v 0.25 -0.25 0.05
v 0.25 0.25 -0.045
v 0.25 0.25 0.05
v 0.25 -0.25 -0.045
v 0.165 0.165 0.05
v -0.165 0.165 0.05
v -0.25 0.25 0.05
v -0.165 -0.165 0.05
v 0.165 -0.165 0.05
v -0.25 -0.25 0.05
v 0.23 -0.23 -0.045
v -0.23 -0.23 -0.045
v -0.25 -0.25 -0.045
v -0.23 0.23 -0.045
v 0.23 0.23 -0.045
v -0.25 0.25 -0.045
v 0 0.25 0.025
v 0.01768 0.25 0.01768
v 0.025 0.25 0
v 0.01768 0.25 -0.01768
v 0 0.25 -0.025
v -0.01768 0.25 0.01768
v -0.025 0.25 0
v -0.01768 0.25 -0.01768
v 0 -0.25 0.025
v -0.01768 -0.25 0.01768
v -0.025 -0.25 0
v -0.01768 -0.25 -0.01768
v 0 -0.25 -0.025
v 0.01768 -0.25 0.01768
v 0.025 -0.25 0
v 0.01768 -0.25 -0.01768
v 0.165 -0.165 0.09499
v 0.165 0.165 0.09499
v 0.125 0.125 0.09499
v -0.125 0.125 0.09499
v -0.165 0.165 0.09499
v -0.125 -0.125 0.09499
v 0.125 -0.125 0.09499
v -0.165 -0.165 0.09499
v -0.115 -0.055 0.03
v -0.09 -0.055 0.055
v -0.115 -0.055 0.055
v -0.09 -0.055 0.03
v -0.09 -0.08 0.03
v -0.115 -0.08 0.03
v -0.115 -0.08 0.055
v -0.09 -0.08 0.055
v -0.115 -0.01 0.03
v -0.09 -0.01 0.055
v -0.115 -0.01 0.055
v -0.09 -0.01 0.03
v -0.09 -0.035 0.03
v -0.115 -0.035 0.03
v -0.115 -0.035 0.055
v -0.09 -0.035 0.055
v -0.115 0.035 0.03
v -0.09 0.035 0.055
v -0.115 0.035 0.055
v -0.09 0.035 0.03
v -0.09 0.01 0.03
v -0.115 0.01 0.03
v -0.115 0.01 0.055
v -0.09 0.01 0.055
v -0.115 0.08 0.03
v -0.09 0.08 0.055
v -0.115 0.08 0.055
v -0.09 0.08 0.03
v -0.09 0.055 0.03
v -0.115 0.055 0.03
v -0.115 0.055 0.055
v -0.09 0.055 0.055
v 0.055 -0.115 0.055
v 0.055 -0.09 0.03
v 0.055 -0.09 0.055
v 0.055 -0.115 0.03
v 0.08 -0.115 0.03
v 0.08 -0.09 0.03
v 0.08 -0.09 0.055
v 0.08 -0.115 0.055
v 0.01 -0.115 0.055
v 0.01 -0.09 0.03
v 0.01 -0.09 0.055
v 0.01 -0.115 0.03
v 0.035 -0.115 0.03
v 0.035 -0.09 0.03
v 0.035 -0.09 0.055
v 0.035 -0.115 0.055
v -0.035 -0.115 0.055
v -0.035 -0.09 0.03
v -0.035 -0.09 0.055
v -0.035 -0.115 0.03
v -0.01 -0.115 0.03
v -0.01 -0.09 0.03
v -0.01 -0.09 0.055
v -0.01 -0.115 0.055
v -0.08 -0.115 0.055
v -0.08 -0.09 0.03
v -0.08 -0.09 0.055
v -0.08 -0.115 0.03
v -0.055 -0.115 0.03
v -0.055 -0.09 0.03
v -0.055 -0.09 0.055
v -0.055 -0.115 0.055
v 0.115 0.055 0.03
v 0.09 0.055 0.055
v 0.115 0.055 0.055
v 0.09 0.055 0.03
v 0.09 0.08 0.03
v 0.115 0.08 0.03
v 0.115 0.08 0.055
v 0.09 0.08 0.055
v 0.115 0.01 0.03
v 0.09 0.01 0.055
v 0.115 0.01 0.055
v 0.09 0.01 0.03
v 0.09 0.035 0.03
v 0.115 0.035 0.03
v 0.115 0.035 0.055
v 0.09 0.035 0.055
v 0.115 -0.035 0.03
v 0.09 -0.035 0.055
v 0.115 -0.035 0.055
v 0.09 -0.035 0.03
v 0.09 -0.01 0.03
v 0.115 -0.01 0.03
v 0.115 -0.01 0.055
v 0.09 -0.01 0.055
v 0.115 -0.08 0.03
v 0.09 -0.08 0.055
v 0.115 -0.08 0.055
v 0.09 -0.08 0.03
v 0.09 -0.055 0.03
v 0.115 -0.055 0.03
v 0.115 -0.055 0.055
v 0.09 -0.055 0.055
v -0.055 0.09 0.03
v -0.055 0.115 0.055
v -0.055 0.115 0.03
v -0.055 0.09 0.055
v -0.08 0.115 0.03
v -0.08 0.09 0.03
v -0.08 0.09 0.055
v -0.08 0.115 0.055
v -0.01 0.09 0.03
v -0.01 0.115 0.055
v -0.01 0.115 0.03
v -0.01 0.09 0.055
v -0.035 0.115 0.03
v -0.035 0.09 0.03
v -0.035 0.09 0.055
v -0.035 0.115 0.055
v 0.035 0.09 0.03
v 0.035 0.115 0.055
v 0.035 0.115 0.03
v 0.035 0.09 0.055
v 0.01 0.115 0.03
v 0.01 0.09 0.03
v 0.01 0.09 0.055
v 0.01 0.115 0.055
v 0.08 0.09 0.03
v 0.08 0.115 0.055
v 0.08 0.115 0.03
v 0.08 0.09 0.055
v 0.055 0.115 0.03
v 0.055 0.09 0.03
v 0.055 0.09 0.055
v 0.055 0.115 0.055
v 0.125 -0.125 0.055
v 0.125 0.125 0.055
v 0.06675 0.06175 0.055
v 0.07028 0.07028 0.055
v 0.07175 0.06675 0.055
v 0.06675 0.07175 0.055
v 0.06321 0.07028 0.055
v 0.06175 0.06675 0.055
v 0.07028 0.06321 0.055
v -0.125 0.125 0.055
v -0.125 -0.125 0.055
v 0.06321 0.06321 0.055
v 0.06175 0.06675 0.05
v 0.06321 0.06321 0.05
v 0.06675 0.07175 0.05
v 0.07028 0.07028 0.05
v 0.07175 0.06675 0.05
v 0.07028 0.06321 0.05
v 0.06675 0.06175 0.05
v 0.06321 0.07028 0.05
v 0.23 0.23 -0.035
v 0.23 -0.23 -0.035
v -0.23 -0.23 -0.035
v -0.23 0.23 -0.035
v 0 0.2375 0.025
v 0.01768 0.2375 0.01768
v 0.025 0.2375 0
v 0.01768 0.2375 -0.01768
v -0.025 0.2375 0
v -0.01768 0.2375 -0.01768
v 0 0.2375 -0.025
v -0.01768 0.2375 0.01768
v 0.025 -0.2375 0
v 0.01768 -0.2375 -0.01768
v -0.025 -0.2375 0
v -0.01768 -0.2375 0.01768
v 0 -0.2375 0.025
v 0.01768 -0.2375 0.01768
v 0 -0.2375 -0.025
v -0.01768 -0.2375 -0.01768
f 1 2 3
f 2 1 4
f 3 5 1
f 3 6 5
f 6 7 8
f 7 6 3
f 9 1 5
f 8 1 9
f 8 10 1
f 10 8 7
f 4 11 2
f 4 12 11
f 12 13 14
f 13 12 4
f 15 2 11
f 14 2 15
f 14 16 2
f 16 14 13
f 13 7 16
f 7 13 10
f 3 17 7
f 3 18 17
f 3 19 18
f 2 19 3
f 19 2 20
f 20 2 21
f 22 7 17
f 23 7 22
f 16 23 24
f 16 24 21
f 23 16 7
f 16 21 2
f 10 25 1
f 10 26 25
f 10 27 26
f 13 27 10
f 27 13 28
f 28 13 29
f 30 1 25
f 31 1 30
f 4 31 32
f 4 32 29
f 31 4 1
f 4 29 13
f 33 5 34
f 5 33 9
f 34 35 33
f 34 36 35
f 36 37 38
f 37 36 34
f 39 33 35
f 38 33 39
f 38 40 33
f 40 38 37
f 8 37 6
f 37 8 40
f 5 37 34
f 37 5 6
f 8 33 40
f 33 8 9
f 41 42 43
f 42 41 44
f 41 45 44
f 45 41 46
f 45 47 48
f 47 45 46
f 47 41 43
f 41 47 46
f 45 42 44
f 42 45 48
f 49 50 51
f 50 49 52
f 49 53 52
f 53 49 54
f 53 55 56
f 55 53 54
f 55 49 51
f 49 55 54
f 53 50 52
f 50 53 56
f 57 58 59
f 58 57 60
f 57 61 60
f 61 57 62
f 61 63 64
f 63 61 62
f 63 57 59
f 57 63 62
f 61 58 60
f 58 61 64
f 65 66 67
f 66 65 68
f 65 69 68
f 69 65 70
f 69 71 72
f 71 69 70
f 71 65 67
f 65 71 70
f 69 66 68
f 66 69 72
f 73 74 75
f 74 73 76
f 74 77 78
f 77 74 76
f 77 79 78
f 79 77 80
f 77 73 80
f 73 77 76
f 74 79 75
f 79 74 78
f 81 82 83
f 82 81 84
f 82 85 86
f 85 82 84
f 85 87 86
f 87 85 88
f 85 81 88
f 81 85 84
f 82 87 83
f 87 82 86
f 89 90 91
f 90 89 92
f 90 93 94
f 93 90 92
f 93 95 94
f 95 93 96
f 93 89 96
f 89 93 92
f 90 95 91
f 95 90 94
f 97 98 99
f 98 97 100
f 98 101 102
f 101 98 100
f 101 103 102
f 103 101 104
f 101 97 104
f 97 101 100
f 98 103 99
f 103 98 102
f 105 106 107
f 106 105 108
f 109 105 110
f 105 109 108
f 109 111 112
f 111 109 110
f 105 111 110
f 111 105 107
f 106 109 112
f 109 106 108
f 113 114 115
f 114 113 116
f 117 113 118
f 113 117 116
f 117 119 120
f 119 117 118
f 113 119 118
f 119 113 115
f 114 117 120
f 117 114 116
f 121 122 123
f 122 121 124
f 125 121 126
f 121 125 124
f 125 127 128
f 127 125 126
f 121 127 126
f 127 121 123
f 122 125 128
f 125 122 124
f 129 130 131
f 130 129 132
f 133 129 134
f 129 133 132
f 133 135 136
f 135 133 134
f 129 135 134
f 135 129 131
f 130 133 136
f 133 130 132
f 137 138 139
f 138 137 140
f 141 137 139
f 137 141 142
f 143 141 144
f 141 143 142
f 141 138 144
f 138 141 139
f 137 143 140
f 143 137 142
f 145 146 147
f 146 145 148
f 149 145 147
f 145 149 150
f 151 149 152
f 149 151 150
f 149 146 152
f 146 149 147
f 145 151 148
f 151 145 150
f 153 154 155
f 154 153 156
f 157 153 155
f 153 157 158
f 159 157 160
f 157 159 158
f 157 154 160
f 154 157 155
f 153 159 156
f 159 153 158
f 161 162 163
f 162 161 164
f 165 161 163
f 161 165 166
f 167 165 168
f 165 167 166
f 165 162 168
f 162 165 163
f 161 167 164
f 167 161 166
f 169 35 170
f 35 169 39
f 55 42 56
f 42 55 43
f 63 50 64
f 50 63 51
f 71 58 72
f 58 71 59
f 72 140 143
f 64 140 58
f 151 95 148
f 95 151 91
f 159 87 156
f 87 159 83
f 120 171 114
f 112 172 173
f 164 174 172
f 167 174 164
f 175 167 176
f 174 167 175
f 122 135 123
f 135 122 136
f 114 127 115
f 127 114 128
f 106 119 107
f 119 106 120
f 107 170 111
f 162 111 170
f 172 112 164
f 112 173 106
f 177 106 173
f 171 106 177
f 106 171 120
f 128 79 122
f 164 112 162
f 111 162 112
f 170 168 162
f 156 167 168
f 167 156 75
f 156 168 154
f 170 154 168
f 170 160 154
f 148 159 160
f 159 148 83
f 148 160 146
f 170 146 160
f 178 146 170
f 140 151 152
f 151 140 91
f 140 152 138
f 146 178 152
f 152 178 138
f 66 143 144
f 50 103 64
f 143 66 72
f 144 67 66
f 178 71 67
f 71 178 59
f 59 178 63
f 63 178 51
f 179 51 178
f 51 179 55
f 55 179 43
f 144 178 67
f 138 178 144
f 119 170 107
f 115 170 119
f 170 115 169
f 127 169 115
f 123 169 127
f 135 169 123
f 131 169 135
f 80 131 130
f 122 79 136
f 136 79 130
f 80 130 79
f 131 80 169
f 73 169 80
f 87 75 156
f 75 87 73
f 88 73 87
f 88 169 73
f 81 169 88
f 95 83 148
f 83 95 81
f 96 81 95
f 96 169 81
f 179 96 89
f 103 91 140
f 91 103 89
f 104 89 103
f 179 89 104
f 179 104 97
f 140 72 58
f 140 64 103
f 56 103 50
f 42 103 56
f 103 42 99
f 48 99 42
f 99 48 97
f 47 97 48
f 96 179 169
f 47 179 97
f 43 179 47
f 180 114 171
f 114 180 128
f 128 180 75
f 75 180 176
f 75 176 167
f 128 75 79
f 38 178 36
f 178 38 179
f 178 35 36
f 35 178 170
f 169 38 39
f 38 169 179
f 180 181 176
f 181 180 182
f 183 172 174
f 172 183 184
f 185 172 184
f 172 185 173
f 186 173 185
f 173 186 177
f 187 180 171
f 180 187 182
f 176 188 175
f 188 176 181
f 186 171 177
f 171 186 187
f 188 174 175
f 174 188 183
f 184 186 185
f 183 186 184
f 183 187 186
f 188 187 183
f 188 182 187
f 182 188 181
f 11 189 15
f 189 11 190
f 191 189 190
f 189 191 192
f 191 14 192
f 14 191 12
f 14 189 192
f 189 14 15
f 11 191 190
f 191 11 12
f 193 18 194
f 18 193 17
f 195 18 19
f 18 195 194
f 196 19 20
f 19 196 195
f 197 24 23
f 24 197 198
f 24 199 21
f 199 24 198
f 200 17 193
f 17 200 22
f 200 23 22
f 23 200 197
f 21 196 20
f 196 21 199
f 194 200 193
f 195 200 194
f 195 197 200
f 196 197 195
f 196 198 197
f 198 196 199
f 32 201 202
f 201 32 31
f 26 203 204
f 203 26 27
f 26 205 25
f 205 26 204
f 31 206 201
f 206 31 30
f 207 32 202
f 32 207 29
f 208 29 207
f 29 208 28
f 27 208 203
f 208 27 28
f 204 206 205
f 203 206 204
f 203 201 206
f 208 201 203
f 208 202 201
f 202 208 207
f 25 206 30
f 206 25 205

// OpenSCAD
// file: DataSymbol.scad
boxSize = 0.029;
lineSize = 0.0045;
symDepth = 0.01;
vertSeparation = 0.019;
horizSeparation = 0.018;

module DataSymbol() {
  boxVertCenter = (boxSize+vertSeparation)/2;
  boxHorizCenter = (boxSize+horizSeparation)/2;
  linear_extrude(symDepth, center=true) {
    translate([0,boxVertCenter]) square(boxSize, center=true); // top box
    translate([-boxHorizCenter,-boxVertCenter]) square(boxSize, center=true); // bottom left box
    translate([boxHorizCenter,-boxVertCenter]) square(boxSize, center=true); // bottom right box
    square([2*boxHorizCenter + lineSize, lineSize], center=true); // middle line
    translate([0, horizSeparation/4]) square([lineSize, horizSeparation/2 + lineSize], center=true); // line to top
    translate([-boxHorizCenter, -horizSeparation/4]) square([lineSize, horizSeparation/2 + lineSize], center=true); // line to bottom left
    translate([boxHorizCenter, -horizSeparation/4]) square([lineSize, horizSeparation/2 + lineSize], center=true); // line to bottom right
  }
}

DataSymbol();
// file: PowerSymbol.scad
symWidth = 0.038;
symHeight = 0.086;
symDepth = 0.01;
middleHeight = 0.0075;
topHorizOffset = 0.007;
sideVertOffset = 0.007;

module PowerSymbol() {
  linear_extrude(symDepth, center=true) {
    halfHei = symHeight/2;
    halfWid = symWidth/2;
    halfMid = middleHeight/2;
    polygon([
      [topHorizOffset, halfHei],
      [0, halfMid],
      [halfWid, sideVertOffset],
      [-topHorizOffset, -halfHei],
      [0, -halfMid],
      [-halfWid, -sideVertOffset]
    ]);
  }
}

PowerSymbol();
// file: BasicFPGAHousing_paintcap.scad
include <FPGA_shared.scad>;
use <BasicFPGAHousing_base.scad>;

module BasicFPGAHousing_paintcap() {
  bevelDepth = capBevel * sqrt(2);
  difference() {
    translate([0,0,baseTop]) {
      cube(size=[capSize, capSize, capDepth*2], center=true);
    }
    cube(size=[slotSize+eps, slotSize+eps, smallGridSize], center=true);
    for (edge=[1:4]) rotate([0,0,90*edge]) {
      translate([0,capSize/2,baseTop+capDepth]) rotate([45,0,0])
        cube(size=[capSize+0.1, bevelDepth, bevelDepth*2], center=true);
    }
  }
}

%BasicFPGAHousing_base();
BasicFPGAHousing_paintcap();
// file: BasicFPGAHousing_base.scad
include <FPGA_shared.scad>;
use <BasicFPGAHousing_paintcap.scad>;
use <PowerSymbol.scad>;
use <DataSymbol.scad>;

module BasicFPGAHousing_chipcutout() {
  slotPinBaseOffset = (-slotPinEdgeCount-1)/2 * slotPinEdgeSpacing;
  slotPinEdgeOffset = slotSize/2 - slotPinSize/2 - slotPinEdgePad;
  union() {
    translate([0, 0, baseDepth/2 + slotBottom + slotPinDepth]) {
      cube(size=[slotSize, slotSize, baseDepth], center=true);
    }
    for(edge=[1:4]) rotate([0,0,90*edge]) {
      for(i=[1:slotPinEdgeCount]) {
        translate([
          slotPinBaseOffset + slotPinEdgeSpacing*i,
          slotPinEdgeOffset,
          slotBottom + slotPinDepth
        ]) {
          cube(size=[slotPinSize, slotPinSize, slotPinDepth*2], center=true);
        }
      }
    }
    translate([alignHoleOffset,alignHoleOffset,slotBottom + slotPinDepth])
      cylinder(h=alignHoleDepth*2, r=alignHoleRadius, center=true, $fn=alignHoleSides);
  }
}

module BasicFPGAHousing_base() {
  middleSize = (slotSize + capSize) / 2;
  difference() {
    union() {
      translate([0,0,baseCenter])
        cube(size=[baseSize, baseSize, baseDepth], center=true);
      translate([0,0,baseTop-eps])
        cube(size=[middleSize, middleSize, capDepth*2], center=true);
    }
    translate([0,0,baseBottom])
      cube(size=[baseBackCutoutSize, baseBackCutoutSize, baseBackCutoutDepth*2], center=true);
    BasicFPGAHousing_chipcutout();
  }
}

BasicFPGAHousing_base();
%BasicFPGAHousing_paintcap();
// file: FPGA_shared.scad
smallGridSize = 0.5;
baseSize = smallGridSize;
baseTop = 0.05;
baseBottom = -0.045;
baseDepth = baseTop - baseBottom;
baseCenter = (baseTop + baseBottom)/2;
baseBackRim = 0.02;
baseBackCutoutSize = baseSize - baseBackRim*2;
baseBackCutoutDepth = 0.01;
capSize = 0.41;
capDepth = 0.045;
capBevel = 0.01;
slotSize = smallGridSize * 0.5;
slotBottom = 0.03;
slotPinEdgeCount = 4;
slotPinEdgePad = 0.01;
slotPinEdgeSpacing = 0.045;
slotPinSize = 0.025;
slotPinDepth = 0.025;
eps = 0.00001;
chipTotalSize = slotSize - slotPinEdgePad*2 - slotPinSize/2;
chipTotalHeight = 0.1;
chipBaseHeight = 0.05;
pinHorizLength = 0.022;
pinHorizUnderLength = 0.008;
pinHorizWidth = 0.02;
pinHorizHeight = 0.015;
pinVertInnerOffset = 0.003;
pinVertOuterOffset = 0.003;
pinVertNarrowOffset = 0.003;
pinTotalHeight = chipTotalHeight - chipBaseHeight/2 + pinHorizHeight/2;
chipBaseSize = chipTotalSize - pinHorizLength*2;
chipBaseBevelSize = 0.005;
alignHoleRadius = 0.005;
alignHoleOffset = chipBaseSize/2 - 0.02;
alignHoleDepth = 0.005;
alignHoleSides = 8;
decoPinCount = 8;
decoPinWidth = 0.036;
decoPinLength = 0.034;
decoPinHeight = 0.028;
decoPinSpacing = 0.049;
decoPinBevelSize = 0.010;

module cablecutout() {
  cableradius = 0.025;
  cableDepth = 0.0125;
  translate([0,smallGridSize/2,0]) rotate([90,0,0]) {
    cylinder(h=cableDepth*2, r=cableradius, center=true, $fn=8);
  }
}
// main file
include <FPGA_shared.scad>;
use <BasicFPGAHousing_base.scad>;
use <BasicFPGAHousing_paintcap.scad>;
use <PowerSymbol.scad>;
use <DataSymbol.scad>;

module BasicFPGAHousing_logicbase() {
  difference() {
    BasicFPGAHousing_base();
    cablecutout();
    rotate([0,0,180]) cablecutout();
  }
}

BasicFPGAHousing_logicbase();
%BasicFPGAHousing_paintcap();
%translate([0.067,0.25,-0.001]) rotate([-90, 0, 0]) PowerSymbol();
%translate([0.073,-0.25,0.001]) rotate([90, 0, 0]) DataSymbol();
